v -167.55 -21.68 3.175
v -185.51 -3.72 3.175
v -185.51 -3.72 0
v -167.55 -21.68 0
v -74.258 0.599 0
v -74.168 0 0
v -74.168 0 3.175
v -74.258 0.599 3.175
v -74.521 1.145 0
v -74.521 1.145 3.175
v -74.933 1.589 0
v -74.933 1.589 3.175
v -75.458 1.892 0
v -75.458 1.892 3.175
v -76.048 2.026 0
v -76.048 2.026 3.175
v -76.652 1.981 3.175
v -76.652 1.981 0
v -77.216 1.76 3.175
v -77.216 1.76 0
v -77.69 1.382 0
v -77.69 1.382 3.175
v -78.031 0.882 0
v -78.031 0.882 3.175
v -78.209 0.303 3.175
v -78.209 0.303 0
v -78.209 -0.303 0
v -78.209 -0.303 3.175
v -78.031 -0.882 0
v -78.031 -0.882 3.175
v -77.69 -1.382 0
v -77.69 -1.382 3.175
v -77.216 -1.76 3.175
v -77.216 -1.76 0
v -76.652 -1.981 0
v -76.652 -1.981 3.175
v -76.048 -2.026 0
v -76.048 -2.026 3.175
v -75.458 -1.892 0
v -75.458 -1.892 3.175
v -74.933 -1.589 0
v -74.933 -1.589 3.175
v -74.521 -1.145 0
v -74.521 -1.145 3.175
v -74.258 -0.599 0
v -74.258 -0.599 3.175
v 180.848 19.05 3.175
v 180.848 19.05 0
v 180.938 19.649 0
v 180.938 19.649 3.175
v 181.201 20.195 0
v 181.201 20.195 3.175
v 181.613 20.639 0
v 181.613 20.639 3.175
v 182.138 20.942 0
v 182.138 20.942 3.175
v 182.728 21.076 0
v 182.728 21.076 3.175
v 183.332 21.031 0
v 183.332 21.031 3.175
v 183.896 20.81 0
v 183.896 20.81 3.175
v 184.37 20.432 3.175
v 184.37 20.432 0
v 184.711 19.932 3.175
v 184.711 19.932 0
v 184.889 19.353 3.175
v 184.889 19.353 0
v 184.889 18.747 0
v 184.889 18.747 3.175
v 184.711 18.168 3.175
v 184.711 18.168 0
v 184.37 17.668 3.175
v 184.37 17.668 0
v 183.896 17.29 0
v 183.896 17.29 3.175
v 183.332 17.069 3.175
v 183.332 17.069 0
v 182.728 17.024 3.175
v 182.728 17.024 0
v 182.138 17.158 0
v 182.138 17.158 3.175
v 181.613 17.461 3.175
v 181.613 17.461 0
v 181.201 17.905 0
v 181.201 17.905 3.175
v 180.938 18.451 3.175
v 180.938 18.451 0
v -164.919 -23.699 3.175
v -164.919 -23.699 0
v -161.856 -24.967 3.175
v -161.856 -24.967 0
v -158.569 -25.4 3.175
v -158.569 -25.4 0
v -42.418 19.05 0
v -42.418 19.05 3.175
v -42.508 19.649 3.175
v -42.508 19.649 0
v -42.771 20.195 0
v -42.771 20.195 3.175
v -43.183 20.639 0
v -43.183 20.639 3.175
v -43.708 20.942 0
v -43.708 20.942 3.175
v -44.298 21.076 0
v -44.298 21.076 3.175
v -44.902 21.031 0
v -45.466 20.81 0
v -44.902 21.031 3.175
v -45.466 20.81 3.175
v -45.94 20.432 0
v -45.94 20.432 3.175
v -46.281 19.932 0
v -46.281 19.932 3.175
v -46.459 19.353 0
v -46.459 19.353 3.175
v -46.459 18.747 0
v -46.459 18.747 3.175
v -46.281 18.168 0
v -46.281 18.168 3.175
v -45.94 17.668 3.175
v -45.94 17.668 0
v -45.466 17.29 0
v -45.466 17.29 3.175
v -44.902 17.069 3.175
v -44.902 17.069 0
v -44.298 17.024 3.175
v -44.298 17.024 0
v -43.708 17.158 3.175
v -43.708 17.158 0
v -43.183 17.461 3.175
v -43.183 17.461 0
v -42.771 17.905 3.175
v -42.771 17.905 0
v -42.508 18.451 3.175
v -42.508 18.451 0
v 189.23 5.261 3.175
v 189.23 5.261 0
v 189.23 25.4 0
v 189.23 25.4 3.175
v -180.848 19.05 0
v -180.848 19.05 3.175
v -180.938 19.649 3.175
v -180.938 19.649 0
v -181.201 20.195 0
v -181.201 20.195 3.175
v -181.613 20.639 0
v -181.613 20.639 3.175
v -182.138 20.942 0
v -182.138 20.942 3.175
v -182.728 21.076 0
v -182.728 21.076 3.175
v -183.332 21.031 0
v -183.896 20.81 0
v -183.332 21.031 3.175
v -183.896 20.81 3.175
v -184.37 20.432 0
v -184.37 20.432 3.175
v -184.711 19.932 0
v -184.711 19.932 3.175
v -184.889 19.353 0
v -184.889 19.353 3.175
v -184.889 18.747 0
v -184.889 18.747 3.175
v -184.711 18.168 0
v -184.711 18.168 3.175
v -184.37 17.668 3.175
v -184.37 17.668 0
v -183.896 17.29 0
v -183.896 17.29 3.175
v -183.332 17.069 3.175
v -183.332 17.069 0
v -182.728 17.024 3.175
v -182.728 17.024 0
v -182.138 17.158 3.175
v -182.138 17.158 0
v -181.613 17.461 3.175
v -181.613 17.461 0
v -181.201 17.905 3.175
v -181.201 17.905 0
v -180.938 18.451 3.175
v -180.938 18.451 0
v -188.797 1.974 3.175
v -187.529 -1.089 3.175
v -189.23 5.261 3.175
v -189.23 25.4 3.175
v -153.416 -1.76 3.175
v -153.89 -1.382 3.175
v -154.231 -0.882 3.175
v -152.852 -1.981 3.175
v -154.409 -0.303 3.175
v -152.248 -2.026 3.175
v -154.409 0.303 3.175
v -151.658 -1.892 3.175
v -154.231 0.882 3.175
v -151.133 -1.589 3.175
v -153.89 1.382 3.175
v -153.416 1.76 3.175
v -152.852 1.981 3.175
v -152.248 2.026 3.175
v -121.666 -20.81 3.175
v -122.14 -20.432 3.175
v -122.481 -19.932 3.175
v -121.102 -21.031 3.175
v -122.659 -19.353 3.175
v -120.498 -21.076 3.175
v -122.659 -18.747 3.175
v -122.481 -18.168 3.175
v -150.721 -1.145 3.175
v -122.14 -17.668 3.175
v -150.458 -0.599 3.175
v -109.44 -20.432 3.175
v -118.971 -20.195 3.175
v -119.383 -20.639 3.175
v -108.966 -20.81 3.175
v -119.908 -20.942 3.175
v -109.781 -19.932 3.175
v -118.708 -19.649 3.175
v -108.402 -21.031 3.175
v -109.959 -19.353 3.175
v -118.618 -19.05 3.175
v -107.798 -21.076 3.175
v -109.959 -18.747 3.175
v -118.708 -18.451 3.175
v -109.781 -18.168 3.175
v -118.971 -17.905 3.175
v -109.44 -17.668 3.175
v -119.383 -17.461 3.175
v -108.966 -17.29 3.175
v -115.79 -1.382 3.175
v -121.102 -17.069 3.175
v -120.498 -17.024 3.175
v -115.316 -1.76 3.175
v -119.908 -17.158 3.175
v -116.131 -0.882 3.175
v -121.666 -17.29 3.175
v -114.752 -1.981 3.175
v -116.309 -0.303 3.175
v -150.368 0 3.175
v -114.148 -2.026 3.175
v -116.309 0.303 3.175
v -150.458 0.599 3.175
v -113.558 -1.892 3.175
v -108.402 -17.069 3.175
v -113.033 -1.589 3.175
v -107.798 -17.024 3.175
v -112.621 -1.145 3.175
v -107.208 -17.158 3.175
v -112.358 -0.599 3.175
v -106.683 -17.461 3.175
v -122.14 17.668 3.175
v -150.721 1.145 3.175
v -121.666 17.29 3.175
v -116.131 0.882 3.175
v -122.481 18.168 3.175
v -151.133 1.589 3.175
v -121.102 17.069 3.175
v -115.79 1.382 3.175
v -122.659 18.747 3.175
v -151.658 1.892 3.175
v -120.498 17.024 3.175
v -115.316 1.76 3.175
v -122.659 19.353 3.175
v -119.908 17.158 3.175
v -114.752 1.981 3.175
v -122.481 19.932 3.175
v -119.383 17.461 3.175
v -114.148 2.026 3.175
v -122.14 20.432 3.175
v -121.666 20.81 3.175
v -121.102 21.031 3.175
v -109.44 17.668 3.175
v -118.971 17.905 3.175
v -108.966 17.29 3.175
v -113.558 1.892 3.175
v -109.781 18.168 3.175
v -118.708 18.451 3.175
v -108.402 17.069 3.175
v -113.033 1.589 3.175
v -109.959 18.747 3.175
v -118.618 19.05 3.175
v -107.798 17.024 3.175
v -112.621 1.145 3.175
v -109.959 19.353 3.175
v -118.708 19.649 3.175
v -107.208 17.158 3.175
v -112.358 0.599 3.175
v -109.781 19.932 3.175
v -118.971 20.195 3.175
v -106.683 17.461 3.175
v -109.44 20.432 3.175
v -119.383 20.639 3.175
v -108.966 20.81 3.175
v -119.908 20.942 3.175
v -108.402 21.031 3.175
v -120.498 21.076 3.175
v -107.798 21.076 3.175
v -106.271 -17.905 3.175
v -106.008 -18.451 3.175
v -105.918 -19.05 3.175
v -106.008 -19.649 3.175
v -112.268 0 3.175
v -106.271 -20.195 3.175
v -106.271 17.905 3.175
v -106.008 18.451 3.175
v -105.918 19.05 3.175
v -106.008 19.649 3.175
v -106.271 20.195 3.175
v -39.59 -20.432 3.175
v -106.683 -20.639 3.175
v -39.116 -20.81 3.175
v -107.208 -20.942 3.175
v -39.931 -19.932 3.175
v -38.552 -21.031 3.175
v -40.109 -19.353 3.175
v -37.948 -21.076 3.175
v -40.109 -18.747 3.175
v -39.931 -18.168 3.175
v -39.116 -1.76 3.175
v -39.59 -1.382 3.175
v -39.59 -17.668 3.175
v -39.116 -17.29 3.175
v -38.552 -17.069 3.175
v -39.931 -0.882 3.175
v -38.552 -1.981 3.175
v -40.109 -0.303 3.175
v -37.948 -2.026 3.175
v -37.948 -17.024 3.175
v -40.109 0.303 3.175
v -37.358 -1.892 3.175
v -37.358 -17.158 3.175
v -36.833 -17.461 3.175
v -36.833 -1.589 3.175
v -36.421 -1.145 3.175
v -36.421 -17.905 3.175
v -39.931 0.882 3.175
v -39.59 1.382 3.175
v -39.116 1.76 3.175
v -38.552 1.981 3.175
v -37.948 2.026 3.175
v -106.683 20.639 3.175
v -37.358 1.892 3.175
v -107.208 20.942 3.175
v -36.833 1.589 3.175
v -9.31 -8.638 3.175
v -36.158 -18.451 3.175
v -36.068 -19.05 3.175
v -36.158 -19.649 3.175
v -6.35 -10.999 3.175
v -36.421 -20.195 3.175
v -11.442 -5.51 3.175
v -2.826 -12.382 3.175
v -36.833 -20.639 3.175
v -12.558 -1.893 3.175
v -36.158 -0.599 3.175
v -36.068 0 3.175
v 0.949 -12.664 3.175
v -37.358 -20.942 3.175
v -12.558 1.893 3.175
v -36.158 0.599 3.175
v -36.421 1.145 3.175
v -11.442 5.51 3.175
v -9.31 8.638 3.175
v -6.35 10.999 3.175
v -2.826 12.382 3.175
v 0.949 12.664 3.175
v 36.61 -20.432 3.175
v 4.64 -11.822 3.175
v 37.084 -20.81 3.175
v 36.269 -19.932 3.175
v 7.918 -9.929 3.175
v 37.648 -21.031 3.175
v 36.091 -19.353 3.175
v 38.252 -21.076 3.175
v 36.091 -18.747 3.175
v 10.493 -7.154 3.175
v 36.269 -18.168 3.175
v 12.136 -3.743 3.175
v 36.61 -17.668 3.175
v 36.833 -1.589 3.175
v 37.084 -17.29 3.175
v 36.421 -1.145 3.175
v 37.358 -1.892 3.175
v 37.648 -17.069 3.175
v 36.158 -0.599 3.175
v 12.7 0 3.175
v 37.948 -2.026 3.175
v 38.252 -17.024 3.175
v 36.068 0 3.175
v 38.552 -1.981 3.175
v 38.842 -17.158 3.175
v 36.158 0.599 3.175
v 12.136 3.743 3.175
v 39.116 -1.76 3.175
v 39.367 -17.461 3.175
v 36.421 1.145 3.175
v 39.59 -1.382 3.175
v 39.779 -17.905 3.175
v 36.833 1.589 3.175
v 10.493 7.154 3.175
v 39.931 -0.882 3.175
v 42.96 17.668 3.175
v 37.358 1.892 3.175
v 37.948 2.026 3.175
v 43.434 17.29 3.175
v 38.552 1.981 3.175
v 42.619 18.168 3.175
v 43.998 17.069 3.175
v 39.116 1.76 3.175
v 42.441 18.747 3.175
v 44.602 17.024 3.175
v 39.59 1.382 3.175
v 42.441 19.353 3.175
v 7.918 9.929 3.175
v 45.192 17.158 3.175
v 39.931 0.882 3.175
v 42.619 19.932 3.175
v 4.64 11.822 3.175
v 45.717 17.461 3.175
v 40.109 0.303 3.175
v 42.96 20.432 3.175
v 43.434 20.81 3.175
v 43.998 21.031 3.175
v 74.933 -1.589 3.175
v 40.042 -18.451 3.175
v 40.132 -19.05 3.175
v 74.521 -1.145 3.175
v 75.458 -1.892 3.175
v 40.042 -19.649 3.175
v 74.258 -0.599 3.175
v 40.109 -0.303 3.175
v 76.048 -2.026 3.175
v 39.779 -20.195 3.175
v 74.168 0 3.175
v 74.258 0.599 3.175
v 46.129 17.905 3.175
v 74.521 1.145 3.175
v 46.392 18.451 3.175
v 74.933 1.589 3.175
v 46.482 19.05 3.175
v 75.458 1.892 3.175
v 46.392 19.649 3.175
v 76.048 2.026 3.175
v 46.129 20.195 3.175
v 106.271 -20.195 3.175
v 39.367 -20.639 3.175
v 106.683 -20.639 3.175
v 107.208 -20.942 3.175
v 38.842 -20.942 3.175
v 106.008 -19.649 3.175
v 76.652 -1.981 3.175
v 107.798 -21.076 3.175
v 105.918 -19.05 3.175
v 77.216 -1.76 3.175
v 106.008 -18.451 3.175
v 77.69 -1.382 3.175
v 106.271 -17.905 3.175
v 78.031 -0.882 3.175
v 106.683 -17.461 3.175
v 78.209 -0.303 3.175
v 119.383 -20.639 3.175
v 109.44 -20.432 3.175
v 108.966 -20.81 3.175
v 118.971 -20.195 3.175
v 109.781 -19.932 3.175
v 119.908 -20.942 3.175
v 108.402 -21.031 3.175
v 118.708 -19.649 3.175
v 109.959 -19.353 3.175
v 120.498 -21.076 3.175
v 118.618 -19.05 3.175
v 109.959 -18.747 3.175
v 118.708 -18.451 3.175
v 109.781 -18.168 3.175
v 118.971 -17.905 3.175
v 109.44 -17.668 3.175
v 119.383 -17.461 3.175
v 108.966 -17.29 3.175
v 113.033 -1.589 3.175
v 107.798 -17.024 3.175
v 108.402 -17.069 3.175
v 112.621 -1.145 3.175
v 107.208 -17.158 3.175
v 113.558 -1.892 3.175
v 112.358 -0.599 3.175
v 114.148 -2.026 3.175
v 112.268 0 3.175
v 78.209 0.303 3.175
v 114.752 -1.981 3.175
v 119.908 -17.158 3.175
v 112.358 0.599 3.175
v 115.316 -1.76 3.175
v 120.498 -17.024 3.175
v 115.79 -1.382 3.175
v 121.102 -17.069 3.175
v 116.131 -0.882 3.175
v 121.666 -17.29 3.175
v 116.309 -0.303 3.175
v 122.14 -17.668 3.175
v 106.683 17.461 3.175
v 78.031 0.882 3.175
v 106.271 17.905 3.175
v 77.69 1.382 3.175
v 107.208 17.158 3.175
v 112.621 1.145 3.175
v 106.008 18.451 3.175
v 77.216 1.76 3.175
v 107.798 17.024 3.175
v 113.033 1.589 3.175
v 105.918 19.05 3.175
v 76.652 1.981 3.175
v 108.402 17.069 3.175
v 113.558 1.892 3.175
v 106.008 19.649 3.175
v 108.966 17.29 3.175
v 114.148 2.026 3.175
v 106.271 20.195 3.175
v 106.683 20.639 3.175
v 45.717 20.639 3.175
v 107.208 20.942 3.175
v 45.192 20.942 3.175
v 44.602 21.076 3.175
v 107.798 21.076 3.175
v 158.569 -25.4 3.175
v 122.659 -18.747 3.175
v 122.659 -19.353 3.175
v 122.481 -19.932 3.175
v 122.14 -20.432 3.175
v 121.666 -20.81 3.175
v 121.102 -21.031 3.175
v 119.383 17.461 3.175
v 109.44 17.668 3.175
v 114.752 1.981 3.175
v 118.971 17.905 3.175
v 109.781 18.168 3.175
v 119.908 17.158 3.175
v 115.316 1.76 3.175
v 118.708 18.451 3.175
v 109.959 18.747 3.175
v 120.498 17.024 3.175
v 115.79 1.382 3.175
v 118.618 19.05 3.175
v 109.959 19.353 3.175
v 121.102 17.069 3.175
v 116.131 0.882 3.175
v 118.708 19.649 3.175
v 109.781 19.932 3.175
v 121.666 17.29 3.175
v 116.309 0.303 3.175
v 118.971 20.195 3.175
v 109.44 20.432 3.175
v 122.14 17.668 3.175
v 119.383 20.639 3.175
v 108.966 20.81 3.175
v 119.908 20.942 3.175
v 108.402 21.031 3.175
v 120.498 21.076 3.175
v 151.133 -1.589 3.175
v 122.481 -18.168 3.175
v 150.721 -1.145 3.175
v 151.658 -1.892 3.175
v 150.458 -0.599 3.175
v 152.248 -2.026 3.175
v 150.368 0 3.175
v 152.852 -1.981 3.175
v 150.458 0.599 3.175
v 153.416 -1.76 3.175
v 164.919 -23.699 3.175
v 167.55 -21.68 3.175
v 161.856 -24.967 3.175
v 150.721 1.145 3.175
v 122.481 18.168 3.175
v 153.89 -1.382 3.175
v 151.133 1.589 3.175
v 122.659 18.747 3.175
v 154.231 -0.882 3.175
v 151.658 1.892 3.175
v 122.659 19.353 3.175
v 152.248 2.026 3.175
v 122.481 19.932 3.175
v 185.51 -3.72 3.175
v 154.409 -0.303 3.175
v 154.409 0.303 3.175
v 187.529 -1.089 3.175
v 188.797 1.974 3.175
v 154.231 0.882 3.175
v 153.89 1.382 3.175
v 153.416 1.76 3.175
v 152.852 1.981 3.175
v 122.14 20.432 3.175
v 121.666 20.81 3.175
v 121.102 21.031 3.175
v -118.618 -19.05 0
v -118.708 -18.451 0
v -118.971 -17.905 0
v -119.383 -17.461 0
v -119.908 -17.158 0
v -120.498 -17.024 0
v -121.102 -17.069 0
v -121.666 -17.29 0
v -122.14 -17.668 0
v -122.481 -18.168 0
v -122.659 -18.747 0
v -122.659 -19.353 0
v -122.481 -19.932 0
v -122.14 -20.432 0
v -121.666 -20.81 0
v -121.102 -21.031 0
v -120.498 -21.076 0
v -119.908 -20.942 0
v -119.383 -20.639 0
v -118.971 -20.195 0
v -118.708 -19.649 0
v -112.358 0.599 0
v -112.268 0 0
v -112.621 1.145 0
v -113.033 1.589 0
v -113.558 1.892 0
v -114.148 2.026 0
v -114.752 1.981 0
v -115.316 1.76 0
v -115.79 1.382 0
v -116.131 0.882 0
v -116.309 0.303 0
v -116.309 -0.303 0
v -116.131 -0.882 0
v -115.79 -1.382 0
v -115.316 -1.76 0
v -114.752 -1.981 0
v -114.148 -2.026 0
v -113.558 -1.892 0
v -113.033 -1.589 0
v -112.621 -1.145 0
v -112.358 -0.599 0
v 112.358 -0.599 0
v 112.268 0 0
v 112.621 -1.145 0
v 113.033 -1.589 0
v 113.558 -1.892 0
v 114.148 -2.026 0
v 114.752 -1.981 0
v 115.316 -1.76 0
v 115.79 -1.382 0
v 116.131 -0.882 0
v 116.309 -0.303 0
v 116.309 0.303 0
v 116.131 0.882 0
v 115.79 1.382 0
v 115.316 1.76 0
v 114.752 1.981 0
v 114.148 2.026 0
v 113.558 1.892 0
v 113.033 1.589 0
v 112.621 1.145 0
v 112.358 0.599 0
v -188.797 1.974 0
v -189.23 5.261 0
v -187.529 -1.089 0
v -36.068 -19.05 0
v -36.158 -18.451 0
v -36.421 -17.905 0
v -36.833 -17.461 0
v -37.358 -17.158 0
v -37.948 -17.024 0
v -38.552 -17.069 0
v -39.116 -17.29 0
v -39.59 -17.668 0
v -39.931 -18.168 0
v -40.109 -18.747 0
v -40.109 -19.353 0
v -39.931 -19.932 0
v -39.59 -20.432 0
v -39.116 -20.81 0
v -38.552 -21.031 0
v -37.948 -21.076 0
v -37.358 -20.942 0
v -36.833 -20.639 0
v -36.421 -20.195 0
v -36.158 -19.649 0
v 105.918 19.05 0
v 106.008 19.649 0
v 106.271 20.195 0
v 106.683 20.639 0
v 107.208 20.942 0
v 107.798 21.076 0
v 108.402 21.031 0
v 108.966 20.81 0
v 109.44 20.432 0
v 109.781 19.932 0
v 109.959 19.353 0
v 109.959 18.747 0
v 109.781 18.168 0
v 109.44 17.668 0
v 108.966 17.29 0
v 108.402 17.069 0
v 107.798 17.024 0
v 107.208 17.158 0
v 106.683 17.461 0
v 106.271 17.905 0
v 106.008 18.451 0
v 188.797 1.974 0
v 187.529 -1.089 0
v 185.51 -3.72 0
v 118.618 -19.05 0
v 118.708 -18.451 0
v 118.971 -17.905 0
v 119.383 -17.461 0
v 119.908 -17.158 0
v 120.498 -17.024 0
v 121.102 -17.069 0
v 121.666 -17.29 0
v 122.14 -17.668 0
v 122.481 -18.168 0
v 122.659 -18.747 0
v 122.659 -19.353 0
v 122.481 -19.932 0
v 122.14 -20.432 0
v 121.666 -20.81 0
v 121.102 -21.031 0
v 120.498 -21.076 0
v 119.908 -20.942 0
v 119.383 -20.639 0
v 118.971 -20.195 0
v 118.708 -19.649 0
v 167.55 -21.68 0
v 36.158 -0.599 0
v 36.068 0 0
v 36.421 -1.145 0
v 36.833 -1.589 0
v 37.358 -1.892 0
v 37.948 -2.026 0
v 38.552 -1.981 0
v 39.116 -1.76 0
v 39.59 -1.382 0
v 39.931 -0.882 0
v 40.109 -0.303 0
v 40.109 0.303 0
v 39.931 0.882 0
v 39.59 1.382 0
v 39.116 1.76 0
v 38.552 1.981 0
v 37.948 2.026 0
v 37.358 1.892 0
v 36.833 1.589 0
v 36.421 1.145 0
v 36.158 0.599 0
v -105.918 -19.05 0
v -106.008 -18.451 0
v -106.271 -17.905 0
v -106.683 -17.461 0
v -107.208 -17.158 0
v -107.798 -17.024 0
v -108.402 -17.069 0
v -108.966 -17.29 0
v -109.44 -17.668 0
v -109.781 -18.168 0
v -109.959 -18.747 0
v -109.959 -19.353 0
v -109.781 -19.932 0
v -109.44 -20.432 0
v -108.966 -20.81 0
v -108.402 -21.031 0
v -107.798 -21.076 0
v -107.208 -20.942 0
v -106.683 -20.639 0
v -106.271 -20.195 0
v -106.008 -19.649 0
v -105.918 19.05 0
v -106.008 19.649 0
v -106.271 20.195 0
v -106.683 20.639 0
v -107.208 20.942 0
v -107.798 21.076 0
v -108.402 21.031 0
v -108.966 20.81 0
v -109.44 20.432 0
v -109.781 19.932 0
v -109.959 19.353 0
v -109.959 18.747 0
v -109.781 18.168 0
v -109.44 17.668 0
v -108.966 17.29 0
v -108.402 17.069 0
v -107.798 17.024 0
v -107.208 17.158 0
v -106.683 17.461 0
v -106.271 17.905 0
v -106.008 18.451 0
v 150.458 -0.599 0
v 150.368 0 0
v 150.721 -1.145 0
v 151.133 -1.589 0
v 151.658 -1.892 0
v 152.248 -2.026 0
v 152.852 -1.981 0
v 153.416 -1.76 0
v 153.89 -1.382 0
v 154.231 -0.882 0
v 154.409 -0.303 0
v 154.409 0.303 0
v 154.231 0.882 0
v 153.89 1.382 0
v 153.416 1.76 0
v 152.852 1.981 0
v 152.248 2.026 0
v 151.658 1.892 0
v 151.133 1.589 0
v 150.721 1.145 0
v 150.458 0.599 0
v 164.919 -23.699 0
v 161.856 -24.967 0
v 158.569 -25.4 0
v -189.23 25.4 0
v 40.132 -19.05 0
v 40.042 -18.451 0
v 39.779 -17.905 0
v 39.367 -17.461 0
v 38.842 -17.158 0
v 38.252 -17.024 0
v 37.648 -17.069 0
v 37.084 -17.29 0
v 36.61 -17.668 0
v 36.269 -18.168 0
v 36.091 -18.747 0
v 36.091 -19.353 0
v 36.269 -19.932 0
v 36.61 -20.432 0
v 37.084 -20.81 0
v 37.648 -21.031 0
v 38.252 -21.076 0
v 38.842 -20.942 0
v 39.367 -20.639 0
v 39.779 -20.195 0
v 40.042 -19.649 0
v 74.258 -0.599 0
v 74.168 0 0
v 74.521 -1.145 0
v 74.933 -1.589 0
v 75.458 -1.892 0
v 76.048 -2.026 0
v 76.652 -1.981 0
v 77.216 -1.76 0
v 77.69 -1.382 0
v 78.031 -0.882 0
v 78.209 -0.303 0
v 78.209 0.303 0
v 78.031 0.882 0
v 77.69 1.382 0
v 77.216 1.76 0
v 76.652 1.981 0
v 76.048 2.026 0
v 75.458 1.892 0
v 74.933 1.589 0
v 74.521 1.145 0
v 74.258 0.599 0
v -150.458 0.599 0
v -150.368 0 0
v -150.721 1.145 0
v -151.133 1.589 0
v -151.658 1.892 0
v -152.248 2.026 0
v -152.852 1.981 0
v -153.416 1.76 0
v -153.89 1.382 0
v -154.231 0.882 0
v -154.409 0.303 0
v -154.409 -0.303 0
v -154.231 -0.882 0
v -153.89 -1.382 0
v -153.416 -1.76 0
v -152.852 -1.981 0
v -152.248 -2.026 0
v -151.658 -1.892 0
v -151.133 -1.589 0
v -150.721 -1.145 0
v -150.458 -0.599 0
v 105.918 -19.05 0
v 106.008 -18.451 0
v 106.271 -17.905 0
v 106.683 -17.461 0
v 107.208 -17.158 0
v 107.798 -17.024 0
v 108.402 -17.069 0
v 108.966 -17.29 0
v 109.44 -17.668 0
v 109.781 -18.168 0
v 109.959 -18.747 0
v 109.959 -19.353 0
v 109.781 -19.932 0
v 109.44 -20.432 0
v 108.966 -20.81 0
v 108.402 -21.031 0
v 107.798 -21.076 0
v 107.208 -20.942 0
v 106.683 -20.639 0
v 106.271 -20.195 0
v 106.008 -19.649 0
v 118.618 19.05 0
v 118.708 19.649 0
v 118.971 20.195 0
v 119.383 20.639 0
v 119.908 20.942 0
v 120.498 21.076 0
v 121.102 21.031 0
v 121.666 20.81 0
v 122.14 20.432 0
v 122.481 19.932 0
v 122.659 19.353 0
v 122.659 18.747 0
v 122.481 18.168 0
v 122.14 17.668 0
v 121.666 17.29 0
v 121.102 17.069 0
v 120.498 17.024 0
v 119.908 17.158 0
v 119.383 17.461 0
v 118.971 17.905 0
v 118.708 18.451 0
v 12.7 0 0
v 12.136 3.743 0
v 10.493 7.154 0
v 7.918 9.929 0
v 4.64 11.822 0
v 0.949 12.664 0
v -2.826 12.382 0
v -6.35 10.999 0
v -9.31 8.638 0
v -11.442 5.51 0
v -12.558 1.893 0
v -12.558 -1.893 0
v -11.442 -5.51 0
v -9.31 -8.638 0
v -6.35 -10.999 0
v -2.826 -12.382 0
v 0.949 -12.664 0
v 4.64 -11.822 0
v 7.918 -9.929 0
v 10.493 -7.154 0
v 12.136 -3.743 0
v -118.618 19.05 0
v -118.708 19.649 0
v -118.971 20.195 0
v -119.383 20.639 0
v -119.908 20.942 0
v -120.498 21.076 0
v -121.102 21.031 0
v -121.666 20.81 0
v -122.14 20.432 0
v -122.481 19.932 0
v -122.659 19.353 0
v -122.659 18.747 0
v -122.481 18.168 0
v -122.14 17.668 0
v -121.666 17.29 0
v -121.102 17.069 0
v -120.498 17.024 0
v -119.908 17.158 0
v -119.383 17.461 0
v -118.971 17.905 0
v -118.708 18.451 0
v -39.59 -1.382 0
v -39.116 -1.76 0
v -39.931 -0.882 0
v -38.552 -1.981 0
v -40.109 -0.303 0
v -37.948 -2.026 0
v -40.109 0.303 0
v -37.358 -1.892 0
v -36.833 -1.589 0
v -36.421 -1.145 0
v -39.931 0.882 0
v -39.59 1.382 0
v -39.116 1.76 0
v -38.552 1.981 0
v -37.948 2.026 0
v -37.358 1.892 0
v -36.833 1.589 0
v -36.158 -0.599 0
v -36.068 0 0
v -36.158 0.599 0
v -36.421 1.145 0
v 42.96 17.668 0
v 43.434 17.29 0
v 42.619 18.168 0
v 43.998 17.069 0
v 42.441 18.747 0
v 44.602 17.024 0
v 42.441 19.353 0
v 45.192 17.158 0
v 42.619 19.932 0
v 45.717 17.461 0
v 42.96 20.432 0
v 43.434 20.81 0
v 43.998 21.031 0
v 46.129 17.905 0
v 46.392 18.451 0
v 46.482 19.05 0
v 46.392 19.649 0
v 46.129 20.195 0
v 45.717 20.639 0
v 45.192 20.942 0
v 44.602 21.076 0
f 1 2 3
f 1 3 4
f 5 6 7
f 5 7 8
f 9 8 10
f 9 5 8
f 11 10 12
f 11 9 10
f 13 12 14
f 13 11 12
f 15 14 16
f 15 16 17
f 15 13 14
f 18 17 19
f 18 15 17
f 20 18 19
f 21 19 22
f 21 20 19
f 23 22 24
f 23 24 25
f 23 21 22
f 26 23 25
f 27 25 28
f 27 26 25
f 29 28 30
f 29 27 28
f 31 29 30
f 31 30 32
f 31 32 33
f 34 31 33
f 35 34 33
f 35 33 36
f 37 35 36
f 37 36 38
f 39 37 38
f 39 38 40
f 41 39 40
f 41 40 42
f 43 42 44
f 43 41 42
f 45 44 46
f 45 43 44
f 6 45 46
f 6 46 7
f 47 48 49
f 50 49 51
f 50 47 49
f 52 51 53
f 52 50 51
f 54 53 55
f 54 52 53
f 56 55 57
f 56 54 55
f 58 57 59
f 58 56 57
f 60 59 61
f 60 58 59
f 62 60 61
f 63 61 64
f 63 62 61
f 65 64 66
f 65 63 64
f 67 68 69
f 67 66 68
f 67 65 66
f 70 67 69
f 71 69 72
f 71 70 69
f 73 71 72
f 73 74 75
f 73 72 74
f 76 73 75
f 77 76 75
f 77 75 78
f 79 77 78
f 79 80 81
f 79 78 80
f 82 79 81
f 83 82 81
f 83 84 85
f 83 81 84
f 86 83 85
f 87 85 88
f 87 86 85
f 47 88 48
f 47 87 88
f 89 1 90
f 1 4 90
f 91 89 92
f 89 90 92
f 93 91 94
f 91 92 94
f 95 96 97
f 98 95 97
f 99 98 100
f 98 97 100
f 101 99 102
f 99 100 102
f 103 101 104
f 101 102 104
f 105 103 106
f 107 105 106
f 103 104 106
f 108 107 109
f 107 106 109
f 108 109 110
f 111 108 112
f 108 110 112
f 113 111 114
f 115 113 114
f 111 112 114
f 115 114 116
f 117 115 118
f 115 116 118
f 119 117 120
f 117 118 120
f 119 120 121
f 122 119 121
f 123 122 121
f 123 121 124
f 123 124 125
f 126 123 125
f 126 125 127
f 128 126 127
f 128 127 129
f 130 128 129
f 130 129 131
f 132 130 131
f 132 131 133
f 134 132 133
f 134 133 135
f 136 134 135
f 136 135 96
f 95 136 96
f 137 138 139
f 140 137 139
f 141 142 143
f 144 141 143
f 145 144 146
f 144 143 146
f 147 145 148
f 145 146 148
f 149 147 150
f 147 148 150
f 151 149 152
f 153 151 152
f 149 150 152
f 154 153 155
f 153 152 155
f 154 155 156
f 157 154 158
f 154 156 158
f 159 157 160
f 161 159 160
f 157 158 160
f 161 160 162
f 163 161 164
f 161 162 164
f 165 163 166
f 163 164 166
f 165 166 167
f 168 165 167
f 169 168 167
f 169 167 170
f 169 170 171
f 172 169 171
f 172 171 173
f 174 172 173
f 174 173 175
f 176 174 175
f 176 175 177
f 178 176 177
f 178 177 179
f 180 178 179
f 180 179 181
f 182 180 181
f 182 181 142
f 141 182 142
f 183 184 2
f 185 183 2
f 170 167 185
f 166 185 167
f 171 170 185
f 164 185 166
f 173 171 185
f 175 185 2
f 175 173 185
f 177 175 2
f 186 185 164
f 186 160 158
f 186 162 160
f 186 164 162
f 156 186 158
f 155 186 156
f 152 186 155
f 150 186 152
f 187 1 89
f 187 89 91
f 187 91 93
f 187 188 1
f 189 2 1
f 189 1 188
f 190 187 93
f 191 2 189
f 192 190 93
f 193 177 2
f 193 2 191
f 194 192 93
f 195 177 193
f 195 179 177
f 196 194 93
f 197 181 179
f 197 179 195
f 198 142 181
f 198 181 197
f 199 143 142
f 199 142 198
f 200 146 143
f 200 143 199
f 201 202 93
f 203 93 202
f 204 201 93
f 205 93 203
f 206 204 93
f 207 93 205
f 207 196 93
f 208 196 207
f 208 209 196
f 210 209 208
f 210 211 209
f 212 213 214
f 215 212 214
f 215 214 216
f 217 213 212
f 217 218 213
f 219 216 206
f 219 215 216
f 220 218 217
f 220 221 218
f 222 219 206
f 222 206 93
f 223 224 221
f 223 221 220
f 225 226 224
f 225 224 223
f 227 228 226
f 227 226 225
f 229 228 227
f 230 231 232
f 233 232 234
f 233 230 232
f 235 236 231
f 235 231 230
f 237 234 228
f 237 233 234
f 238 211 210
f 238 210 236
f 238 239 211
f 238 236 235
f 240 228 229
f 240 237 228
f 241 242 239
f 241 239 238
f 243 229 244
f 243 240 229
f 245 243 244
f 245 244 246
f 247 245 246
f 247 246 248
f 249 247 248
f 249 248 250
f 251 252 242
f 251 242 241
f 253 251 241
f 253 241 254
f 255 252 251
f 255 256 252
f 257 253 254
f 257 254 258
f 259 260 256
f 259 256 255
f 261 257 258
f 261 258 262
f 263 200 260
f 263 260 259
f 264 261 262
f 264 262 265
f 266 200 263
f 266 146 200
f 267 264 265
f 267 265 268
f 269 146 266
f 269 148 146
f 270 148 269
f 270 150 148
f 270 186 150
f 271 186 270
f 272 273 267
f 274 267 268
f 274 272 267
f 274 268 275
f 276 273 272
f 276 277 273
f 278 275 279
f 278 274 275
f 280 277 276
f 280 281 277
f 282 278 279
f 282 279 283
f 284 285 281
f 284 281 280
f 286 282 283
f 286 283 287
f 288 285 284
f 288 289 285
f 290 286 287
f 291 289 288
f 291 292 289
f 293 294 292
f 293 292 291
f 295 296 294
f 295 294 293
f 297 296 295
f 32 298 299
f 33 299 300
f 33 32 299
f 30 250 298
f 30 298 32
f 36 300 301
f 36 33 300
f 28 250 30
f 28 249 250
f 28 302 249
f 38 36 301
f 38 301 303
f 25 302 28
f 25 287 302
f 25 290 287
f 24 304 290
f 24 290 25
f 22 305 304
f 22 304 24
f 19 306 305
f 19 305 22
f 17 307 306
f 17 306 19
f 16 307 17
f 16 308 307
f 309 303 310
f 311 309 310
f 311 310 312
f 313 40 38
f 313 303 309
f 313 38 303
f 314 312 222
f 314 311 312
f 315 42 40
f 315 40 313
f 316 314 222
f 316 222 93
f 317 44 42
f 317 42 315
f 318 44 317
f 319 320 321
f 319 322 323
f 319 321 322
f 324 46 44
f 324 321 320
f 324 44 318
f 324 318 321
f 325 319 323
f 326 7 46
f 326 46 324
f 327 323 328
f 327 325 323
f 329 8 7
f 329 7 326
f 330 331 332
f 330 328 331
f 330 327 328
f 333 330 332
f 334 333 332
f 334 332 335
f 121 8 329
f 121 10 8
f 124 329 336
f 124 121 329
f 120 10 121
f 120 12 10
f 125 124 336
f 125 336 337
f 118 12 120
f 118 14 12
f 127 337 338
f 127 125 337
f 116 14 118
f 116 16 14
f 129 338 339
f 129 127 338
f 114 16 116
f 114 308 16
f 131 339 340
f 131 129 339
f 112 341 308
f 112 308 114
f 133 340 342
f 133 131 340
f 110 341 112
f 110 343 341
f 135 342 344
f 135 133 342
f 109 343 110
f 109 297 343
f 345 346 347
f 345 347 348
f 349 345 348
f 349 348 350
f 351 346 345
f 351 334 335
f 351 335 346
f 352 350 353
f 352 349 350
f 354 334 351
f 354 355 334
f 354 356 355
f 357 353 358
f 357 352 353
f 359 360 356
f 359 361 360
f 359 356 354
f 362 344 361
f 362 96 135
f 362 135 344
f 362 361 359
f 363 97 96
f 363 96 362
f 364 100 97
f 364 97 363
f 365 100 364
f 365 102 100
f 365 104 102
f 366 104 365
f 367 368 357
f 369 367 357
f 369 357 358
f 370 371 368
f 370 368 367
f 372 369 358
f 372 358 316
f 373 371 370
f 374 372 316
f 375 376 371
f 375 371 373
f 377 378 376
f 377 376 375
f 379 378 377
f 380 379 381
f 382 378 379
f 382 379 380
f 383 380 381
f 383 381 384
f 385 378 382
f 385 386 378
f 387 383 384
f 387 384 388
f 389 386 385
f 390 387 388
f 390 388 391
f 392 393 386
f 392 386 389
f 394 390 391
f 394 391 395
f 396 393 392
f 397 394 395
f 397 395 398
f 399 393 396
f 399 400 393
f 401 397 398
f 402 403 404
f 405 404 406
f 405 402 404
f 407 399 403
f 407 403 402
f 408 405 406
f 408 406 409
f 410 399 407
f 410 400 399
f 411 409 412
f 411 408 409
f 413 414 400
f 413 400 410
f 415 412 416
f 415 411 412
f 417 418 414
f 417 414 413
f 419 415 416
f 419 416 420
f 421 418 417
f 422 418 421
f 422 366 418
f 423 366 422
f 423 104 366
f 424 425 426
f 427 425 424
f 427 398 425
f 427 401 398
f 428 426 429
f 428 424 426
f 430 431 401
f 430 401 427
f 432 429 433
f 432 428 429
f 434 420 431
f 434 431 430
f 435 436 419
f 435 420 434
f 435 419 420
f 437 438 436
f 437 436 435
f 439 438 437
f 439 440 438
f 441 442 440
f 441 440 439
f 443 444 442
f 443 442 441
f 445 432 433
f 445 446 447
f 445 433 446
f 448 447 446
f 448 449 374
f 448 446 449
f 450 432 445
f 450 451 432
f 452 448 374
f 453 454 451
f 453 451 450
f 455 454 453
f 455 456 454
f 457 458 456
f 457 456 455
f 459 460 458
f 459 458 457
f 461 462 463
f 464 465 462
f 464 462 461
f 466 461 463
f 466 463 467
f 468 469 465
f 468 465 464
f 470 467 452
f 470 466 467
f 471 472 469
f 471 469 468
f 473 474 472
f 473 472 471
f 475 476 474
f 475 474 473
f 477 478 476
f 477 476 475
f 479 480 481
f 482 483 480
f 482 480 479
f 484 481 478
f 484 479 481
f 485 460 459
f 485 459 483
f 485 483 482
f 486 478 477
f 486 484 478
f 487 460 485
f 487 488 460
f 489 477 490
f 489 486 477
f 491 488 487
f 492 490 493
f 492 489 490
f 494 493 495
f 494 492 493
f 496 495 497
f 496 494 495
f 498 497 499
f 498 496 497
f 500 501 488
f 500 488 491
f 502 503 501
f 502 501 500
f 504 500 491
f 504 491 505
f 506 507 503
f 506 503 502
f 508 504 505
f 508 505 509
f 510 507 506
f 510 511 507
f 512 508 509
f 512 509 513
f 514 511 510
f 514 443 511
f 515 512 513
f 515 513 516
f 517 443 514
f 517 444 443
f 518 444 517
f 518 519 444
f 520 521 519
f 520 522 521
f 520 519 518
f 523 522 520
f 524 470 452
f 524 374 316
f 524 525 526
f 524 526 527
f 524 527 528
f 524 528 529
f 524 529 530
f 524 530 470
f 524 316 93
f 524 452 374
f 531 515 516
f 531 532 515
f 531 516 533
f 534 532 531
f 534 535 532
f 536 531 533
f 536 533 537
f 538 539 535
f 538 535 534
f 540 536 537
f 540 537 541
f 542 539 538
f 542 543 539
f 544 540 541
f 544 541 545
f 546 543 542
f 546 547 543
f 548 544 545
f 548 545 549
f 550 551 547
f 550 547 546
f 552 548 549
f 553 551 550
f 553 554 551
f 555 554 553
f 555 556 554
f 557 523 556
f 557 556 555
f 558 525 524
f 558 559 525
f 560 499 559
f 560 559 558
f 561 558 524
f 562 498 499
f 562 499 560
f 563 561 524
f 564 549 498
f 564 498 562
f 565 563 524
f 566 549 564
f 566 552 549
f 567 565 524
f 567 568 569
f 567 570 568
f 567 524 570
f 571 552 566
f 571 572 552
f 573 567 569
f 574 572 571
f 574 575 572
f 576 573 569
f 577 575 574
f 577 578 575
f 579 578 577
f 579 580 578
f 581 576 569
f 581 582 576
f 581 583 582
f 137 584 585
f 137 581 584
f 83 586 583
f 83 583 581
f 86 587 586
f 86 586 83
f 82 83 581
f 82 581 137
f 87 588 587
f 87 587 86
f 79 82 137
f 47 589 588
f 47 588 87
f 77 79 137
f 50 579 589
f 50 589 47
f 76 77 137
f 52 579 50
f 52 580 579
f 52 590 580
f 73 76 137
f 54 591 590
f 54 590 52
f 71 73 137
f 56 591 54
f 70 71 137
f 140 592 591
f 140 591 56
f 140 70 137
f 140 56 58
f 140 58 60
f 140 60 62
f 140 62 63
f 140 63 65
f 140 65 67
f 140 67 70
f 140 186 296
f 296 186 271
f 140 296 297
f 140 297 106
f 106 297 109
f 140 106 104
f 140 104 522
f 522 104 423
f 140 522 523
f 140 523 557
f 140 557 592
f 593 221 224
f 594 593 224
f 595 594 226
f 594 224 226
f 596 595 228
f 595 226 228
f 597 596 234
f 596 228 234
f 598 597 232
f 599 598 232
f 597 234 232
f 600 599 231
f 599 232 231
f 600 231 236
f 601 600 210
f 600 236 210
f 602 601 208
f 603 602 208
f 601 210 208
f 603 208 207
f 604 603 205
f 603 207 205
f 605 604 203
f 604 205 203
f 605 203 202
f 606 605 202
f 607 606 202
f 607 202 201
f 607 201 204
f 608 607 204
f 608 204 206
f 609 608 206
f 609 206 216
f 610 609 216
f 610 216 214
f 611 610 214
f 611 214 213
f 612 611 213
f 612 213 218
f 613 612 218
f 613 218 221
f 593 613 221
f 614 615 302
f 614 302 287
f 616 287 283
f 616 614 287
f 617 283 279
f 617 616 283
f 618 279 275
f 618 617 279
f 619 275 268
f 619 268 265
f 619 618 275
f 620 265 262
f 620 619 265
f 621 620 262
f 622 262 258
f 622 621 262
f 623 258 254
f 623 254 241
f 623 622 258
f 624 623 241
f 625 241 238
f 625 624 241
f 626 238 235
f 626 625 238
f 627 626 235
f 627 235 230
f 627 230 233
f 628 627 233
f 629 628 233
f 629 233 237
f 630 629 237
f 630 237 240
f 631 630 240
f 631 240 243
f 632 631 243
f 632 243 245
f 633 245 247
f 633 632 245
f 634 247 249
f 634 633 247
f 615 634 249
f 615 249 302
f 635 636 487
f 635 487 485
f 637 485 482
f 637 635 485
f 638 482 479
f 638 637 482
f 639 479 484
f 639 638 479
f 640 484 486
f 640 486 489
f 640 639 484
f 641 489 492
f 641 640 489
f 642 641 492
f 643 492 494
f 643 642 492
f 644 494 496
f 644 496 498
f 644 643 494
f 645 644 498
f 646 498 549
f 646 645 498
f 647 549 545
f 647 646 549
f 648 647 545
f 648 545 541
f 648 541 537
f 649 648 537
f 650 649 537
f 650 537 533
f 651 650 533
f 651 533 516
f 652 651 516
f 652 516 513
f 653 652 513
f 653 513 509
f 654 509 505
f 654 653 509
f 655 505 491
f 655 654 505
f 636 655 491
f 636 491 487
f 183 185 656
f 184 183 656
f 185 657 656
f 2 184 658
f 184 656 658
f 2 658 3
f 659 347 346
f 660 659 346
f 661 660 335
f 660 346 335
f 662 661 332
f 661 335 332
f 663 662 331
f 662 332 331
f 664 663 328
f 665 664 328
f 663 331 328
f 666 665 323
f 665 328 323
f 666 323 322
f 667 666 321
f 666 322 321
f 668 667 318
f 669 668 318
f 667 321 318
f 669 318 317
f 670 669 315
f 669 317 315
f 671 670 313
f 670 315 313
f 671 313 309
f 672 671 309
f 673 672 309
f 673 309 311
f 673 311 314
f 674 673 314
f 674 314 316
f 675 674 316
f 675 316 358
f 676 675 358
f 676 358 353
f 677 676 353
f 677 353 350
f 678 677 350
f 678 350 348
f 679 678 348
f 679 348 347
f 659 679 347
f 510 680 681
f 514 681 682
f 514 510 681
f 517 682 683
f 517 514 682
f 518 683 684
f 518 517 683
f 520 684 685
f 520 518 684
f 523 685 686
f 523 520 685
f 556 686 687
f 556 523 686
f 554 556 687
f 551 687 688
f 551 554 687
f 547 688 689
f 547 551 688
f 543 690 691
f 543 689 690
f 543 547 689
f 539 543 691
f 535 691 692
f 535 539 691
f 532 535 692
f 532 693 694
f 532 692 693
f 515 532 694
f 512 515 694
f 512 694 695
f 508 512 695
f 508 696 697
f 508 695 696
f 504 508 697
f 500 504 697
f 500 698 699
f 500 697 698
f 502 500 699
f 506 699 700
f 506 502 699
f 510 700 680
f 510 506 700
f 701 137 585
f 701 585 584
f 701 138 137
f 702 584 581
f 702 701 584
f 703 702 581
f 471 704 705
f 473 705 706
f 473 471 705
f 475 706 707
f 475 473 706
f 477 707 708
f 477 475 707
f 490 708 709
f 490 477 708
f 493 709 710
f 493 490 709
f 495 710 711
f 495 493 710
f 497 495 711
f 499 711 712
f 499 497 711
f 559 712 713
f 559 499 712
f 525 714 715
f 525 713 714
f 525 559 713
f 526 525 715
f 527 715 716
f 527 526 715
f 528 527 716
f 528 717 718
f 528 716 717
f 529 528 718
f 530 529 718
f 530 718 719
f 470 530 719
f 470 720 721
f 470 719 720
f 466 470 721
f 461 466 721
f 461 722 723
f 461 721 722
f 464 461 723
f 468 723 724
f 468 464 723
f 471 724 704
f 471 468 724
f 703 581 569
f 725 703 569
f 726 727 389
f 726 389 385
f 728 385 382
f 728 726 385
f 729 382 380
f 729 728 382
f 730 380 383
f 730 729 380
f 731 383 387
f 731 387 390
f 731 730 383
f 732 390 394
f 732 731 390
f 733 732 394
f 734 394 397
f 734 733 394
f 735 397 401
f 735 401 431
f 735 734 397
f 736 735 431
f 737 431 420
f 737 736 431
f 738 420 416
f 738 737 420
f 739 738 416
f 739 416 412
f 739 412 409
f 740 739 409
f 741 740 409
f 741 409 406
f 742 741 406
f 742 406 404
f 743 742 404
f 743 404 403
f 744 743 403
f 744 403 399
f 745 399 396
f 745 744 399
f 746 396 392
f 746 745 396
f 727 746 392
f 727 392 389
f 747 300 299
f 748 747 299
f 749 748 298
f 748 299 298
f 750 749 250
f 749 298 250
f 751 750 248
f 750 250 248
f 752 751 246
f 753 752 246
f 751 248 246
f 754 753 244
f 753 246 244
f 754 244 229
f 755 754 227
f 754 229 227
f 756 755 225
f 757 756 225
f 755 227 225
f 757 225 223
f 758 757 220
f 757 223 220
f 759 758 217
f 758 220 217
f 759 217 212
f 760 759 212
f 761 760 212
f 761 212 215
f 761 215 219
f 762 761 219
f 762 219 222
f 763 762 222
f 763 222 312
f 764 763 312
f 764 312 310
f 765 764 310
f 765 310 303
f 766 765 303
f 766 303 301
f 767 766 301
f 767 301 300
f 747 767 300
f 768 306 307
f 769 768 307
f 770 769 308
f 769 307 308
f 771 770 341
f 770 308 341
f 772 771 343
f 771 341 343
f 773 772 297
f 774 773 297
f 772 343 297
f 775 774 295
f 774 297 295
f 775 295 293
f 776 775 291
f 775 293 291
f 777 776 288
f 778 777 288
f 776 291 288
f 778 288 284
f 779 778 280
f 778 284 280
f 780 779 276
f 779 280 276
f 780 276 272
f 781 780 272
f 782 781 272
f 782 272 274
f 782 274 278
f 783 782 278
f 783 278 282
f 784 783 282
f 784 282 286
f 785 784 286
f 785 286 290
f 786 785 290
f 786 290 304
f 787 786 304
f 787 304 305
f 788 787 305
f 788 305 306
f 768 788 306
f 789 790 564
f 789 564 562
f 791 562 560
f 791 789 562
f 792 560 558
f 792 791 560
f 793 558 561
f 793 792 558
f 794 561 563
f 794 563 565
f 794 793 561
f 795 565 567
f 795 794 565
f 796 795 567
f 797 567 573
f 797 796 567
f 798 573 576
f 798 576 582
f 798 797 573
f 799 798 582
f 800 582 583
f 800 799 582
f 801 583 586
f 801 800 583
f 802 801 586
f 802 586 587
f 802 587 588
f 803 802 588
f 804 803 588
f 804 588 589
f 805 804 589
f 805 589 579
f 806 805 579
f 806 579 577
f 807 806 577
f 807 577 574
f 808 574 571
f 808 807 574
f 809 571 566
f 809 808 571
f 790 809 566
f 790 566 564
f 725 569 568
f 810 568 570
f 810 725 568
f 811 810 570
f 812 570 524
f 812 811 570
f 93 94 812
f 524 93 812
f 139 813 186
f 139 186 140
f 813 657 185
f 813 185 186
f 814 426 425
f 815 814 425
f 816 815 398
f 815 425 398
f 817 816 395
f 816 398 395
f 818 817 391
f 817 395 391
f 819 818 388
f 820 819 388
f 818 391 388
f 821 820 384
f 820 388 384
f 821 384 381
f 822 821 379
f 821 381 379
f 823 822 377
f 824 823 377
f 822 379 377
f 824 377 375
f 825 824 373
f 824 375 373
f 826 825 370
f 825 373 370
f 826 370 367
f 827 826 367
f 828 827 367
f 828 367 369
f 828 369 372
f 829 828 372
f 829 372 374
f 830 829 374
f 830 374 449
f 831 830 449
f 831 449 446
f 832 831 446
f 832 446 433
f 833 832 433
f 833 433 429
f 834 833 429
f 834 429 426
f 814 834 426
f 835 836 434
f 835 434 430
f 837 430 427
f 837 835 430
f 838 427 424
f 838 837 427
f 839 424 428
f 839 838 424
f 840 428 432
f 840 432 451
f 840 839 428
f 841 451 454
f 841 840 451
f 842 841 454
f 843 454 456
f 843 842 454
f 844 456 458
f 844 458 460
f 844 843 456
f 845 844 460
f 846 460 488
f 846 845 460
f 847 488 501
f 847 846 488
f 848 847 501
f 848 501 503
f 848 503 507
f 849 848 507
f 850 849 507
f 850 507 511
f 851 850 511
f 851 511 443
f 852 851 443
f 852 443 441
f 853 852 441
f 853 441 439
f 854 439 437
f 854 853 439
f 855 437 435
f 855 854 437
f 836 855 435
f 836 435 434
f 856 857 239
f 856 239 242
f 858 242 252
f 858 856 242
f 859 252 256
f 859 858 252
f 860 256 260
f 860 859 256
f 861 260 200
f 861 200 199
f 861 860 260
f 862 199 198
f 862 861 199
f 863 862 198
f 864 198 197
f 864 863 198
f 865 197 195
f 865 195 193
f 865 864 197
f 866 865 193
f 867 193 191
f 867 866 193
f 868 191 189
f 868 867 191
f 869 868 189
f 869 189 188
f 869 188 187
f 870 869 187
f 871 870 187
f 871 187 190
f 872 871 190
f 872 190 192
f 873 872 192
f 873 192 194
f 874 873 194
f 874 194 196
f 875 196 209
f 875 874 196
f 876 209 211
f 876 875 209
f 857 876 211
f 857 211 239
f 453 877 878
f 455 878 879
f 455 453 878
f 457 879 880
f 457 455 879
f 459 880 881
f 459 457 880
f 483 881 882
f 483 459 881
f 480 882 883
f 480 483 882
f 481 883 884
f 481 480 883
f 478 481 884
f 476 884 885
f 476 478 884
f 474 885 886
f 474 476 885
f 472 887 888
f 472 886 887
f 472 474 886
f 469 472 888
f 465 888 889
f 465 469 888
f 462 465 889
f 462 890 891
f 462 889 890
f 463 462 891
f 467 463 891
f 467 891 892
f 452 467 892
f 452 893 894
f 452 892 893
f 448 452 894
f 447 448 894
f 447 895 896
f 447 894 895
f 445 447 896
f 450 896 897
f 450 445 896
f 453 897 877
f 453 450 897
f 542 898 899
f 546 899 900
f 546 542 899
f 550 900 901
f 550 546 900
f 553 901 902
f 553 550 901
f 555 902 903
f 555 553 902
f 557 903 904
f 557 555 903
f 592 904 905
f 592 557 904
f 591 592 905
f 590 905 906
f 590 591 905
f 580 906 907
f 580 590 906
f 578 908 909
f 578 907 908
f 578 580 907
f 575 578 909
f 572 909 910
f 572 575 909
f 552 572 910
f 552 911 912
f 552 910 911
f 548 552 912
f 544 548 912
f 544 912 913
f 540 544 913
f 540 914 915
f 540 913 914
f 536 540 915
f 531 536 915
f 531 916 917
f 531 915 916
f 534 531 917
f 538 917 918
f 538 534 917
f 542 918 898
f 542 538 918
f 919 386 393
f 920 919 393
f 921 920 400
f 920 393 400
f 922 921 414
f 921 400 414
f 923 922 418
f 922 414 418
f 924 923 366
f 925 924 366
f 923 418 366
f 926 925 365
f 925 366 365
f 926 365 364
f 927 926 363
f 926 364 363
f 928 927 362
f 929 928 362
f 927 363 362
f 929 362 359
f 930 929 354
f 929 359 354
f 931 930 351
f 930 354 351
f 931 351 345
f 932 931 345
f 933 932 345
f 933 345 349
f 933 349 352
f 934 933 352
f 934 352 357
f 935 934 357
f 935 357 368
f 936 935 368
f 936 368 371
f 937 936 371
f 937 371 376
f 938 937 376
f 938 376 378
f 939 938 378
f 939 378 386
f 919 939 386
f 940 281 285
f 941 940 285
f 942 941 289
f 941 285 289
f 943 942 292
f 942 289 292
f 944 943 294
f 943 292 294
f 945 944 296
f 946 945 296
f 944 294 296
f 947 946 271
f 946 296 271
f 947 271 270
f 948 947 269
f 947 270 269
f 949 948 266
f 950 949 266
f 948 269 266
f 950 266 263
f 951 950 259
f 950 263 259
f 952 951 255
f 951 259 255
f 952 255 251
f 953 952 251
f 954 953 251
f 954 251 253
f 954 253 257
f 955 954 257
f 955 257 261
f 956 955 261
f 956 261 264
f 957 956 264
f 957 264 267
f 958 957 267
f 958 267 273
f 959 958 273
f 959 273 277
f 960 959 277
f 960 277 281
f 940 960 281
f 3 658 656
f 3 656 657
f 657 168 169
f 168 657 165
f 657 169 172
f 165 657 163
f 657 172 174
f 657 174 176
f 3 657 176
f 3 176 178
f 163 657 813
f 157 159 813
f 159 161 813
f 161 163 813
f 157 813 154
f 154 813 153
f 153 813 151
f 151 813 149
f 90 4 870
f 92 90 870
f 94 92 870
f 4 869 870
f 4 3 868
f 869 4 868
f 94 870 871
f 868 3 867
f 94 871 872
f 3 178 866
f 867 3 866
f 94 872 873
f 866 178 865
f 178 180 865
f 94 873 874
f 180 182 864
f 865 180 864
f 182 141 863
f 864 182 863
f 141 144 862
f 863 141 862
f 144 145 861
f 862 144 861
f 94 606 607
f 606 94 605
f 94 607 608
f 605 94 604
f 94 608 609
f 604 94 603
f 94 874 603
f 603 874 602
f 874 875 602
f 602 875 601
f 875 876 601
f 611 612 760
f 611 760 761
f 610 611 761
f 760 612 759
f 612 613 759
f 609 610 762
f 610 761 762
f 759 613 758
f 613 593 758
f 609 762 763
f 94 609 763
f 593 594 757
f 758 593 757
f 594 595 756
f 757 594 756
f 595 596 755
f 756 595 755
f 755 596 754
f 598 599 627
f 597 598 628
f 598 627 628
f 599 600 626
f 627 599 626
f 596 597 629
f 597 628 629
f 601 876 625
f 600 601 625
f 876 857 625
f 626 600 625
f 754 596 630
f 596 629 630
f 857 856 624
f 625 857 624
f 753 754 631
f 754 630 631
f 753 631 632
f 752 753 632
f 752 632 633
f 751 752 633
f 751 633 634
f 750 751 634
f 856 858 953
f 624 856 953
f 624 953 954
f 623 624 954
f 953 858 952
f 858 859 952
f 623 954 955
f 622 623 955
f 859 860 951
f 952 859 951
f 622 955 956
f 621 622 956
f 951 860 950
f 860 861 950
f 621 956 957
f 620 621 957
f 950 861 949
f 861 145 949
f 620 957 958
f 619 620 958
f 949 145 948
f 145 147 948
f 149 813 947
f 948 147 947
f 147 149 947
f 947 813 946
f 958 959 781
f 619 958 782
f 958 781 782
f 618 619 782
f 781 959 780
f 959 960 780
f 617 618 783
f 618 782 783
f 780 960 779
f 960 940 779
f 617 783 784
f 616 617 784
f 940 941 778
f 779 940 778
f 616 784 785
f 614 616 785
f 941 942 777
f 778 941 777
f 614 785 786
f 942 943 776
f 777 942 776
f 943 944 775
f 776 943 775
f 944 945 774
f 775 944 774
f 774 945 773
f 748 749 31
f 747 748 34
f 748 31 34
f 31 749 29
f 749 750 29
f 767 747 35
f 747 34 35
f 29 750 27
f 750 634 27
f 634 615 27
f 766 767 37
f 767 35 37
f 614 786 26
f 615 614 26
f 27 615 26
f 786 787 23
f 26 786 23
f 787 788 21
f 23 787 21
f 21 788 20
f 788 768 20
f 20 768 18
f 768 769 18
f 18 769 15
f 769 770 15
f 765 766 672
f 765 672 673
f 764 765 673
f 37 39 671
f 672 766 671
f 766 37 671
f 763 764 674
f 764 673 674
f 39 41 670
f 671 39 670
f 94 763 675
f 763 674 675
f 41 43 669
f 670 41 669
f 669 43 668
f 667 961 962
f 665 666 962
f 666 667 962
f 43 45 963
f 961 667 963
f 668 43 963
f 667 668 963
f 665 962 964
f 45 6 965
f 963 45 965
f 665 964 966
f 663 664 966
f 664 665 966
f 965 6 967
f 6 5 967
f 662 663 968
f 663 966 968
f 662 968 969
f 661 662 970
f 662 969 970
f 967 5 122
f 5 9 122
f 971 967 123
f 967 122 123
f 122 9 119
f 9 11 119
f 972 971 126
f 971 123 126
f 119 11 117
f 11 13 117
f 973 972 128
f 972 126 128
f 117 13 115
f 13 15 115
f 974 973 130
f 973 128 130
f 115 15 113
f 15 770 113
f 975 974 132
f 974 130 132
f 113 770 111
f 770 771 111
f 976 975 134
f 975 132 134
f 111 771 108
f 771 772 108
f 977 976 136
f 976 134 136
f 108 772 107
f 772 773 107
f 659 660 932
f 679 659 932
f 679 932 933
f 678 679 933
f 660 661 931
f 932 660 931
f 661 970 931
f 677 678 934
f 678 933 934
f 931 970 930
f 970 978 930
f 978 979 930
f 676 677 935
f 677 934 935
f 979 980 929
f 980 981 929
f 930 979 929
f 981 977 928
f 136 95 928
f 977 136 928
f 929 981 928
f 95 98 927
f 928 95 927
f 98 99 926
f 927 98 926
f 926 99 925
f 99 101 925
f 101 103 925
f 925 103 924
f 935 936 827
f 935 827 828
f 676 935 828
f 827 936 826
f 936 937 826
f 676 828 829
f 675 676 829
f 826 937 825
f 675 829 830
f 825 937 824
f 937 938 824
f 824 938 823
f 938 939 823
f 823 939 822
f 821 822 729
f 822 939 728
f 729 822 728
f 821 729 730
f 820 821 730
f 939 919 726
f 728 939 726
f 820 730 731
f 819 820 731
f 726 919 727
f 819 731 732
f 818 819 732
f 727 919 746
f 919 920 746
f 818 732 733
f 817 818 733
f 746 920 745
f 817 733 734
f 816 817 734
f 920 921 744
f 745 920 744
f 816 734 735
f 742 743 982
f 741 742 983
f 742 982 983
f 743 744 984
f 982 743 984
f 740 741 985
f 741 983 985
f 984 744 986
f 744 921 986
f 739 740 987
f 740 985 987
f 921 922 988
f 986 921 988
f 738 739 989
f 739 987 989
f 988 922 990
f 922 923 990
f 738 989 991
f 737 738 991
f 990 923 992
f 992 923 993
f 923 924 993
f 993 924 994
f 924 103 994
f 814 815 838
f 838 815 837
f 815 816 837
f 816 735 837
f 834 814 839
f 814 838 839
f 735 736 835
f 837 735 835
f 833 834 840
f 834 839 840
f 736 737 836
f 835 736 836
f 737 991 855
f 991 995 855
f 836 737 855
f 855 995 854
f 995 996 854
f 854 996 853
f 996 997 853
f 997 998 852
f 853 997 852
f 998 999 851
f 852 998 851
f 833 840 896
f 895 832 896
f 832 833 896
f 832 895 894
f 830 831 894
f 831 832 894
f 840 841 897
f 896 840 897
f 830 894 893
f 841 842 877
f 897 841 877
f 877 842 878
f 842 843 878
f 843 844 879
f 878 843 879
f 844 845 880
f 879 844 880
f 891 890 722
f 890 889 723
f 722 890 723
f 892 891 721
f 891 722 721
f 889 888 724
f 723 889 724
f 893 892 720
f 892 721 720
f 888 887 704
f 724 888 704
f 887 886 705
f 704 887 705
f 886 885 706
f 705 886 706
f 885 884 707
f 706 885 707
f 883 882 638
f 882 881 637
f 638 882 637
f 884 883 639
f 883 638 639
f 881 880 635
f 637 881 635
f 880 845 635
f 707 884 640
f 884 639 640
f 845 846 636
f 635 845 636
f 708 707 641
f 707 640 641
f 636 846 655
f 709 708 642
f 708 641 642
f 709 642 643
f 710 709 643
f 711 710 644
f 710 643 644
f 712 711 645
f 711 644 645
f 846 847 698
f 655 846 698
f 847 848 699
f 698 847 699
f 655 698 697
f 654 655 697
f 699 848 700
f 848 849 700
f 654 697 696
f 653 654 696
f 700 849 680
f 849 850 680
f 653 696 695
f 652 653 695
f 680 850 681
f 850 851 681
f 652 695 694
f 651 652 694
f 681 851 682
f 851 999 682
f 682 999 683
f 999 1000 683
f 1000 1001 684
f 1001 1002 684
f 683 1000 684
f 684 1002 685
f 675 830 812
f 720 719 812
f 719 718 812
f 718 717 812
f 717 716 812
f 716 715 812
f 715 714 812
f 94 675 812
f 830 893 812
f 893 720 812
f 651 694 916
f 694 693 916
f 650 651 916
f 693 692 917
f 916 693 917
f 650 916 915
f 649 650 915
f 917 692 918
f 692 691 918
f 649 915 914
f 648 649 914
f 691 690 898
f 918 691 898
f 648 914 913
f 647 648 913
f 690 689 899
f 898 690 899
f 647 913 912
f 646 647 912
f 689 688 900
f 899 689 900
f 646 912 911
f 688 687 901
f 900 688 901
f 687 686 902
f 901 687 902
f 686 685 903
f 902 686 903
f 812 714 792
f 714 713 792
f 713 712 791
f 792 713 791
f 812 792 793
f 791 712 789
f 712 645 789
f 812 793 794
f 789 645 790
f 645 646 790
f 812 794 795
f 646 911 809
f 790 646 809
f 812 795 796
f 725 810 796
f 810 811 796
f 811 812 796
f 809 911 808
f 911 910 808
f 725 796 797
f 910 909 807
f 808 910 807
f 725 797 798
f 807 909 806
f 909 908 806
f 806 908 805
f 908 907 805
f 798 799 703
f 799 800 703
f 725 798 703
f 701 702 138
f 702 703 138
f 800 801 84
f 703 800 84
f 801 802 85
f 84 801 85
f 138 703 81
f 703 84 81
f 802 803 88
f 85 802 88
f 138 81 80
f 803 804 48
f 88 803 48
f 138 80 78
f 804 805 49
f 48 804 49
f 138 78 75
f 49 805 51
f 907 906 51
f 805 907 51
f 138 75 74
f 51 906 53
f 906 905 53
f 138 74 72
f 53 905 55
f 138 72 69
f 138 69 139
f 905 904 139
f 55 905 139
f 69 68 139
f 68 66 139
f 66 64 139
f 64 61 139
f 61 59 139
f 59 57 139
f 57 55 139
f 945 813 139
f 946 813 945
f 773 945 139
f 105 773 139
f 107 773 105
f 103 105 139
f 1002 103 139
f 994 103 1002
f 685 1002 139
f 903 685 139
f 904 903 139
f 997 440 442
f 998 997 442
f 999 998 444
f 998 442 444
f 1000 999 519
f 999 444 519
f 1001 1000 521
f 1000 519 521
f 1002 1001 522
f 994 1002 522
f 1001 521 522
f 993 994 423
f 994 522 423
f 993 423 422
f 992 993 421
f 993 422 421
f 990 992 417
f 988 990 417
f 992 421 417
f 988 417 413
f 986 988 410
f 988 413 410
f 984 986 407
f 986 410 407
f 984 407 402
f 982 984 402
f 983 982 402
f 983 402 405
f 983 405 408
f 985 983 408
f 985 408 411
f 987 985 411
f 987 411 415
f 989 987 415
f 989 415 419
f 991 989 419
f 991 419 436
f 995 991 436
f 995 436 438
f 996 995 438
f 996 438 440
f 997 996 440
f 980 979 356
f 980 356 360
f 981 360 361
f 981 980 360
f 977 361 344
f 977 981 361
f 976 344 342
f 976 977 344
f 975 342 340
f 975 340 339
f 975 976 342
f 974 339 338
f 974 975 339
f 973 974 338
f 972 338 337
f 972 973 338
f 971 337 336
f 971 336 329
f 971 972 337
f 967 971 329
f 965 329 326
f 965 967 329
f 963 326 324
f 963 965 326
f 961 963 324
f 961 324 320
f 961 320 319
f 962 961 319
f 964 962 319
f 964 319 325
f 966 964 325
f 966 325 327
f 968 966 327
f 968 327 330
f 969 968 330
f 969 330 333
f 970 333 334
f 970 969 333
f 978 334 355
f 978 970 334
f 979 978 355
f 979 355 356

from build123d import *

# Parameters (mm, degrees)
SKETCH1_W           = 378.46
SKETCH1_H           = 50.8
SKETCH1_R           = 2.032
BOSS_EXTRUDE1_DEPTH = 3.175
SKETCH2_R           = 12.7
CUT_EXTRUDE1_DEPTH  = 191.953485239
SKETCH3_R           = 2.032
CUT_EXTRUDE2_DEPTH  = 191.953485239
SKETCH4_R           = 2.032
CUT_EXTRUDE3_DEPTH  = 191.953485239
SKETCH6_R           = 2.032
CUT_EXTRUDE5_DEPTH  = 191.953485239
CUT_EXTRUDE6_DEPTH  = 191.953485239
FILLET1_R           = 12.7


with BuildPart() as part:
    # Sketch1 → Boss-Extrude1 (new body)
    with BuildSketch(Plane.XY):
        Rectangle(SKETCH1_W, SKETCH1_H)
        Circle(SKETCH1_R, mode=Mode.SUBTRACT)
        with Locations((-38.1, 0)):
            Circle(SKETCH1_R, mode=Mode.SUBTRACT)
        with Locations((-76.2, 0)):
            Circle(SKETCH1_R, mode=Mode.SUBTRACT)
        with Locations((-114.3, 0)):
            Circle(SKETCH1_R, mode=Mode.SUBTRACT)
        with Locations((-152.4, 0)):
            Circle(SKETCH1_R, mode=Mode.SUBTRACT)
        with Locations(Location((76.2, 0, 0), (0, 0, 180))):
            Circle(SKETCH1_R, mode=Mode.SUBTRACT)
        with Locations(Location((114.3, 0, 0), (0, 0, 180))):
            Circle(SKETCH1_R, mode=Mode.SUBTRACT)
        with Locations(Location((152.4, 0, 0), (0, 0, 180))):
            Circle(SKETCH1_R, mode=Mode.SUBTRACT)
        with Locations(Location((38.1, 0, 0), (0, 0, 180))):
            Circle(SKETCH1_R, mode=Mode.SUBTRACT)
    extrude(amount=BOSS_EXTRUDE1_DEPTH)

    # Sketch2 → Cut-Extrude1 (cut, through all)
    with BuildSketch(Plane.XY.offset(3.175)):
        Circle(SKETCH2_R)
    extrude(amount=-CUT_EXTRUDE1_DEPTH, mode=Mode.SUBTRACT)

    # Sketch3 → Cut-Extrude2 (cut, through all)
    with BuildSketch(Plane.XY.offset(3.175)):
        with Locations((-38.1, -19.05)):
            Circle(SKETCH3_R)
        with Locations((-44.45, 19.05)):
            Circle(SKETCH3_R)
        with Locations((44.45, 19.05)):
            Circle(SKETCH3_R)
        with Locations((38.1, -19.05)):
            Circle(SKETCH3_R)
    extrude(amount=-CUT_EXTRUDE2_DEPTH, mode=Mode.SUBTRACT)

    # Sketch4 → Cut-Extrude3 (cut, through all)
    with BuildSketch(Plane.XY.offset(3.175)):
        with Locations((-107.95, -19.05)):
            Circle(SKETCH4_R)
        with Locations((-120.65, -19.05)):
            Circle(SKETCH4_R)
        with Locations((-120.65, 19.05)):
            Circle(SKETCH4_R)
        with Locations((-107.95, 19.05)):
            Circle(SKETCH4_R)
    cut_extrude3 = extrude(amount=-CUT_EXTRUDE3_DEPTH, mode=Mode.SUBTRACT)

    # Sketch6 → Cut-Extrude5 (cut, through all)
    with BuildSketch(Plane.XY.offset(3.175)):
        with Locations((-182.88, 19.05)):
            Circle(SKETCH6_R)
        with Locations((-182.88, -19.05)):
            Circle(SKETCH6_R)
    cut_extrude5 = extrude(amount=-CUT_EXTRUDE5_DEPTH, mode=Mode.SUBTRACT)

    # Mirror1: Cut-Extrude3, Cut-Extrude5 across plane
    add(cut_extrude3.mirror(Plane(origin=(0, 0, 0), x_dir=(0, 0, 1), z_dir=(1, 0, 0))), mode=Mode.SUBTRACT)
    add(cut_extrude5.mirror(Plane(origin=(0, 0, 0), x_dir=(0, 0, 1), z_dir=(1, 0, 0))), mode=Mode.SUBTRACT)

    # Sketch7 → Cut-Extrude6 (cut, through all)
    with BuildSketch(Plane.XY.offset(3.175)):
        Polygon((-189.23, 0), (-163.83, -25.4), (-189.23, -25.4), align=None)
        Polygon((189.23, -25.4), (189.23, 0), (163.83, -25.4), align=None)
    extrude(amount=-CUT_EXTRUDE6_DEPTH, mode=Mode.SUBTRACT)

    # Fillet1
    fillet1_edges = [part.edges().sort_by_distance(p)[0] for p in [
        (-189.23, 0, 1.5875),
        (-163.83, -25.4, 1.5875),
        (163.83, -25.4, 1.5875),
        (189.23, 0, 1.5875),
    ]]
    fillet(fillet1_edges, radius=FILLET1_R)


solid = part.part
